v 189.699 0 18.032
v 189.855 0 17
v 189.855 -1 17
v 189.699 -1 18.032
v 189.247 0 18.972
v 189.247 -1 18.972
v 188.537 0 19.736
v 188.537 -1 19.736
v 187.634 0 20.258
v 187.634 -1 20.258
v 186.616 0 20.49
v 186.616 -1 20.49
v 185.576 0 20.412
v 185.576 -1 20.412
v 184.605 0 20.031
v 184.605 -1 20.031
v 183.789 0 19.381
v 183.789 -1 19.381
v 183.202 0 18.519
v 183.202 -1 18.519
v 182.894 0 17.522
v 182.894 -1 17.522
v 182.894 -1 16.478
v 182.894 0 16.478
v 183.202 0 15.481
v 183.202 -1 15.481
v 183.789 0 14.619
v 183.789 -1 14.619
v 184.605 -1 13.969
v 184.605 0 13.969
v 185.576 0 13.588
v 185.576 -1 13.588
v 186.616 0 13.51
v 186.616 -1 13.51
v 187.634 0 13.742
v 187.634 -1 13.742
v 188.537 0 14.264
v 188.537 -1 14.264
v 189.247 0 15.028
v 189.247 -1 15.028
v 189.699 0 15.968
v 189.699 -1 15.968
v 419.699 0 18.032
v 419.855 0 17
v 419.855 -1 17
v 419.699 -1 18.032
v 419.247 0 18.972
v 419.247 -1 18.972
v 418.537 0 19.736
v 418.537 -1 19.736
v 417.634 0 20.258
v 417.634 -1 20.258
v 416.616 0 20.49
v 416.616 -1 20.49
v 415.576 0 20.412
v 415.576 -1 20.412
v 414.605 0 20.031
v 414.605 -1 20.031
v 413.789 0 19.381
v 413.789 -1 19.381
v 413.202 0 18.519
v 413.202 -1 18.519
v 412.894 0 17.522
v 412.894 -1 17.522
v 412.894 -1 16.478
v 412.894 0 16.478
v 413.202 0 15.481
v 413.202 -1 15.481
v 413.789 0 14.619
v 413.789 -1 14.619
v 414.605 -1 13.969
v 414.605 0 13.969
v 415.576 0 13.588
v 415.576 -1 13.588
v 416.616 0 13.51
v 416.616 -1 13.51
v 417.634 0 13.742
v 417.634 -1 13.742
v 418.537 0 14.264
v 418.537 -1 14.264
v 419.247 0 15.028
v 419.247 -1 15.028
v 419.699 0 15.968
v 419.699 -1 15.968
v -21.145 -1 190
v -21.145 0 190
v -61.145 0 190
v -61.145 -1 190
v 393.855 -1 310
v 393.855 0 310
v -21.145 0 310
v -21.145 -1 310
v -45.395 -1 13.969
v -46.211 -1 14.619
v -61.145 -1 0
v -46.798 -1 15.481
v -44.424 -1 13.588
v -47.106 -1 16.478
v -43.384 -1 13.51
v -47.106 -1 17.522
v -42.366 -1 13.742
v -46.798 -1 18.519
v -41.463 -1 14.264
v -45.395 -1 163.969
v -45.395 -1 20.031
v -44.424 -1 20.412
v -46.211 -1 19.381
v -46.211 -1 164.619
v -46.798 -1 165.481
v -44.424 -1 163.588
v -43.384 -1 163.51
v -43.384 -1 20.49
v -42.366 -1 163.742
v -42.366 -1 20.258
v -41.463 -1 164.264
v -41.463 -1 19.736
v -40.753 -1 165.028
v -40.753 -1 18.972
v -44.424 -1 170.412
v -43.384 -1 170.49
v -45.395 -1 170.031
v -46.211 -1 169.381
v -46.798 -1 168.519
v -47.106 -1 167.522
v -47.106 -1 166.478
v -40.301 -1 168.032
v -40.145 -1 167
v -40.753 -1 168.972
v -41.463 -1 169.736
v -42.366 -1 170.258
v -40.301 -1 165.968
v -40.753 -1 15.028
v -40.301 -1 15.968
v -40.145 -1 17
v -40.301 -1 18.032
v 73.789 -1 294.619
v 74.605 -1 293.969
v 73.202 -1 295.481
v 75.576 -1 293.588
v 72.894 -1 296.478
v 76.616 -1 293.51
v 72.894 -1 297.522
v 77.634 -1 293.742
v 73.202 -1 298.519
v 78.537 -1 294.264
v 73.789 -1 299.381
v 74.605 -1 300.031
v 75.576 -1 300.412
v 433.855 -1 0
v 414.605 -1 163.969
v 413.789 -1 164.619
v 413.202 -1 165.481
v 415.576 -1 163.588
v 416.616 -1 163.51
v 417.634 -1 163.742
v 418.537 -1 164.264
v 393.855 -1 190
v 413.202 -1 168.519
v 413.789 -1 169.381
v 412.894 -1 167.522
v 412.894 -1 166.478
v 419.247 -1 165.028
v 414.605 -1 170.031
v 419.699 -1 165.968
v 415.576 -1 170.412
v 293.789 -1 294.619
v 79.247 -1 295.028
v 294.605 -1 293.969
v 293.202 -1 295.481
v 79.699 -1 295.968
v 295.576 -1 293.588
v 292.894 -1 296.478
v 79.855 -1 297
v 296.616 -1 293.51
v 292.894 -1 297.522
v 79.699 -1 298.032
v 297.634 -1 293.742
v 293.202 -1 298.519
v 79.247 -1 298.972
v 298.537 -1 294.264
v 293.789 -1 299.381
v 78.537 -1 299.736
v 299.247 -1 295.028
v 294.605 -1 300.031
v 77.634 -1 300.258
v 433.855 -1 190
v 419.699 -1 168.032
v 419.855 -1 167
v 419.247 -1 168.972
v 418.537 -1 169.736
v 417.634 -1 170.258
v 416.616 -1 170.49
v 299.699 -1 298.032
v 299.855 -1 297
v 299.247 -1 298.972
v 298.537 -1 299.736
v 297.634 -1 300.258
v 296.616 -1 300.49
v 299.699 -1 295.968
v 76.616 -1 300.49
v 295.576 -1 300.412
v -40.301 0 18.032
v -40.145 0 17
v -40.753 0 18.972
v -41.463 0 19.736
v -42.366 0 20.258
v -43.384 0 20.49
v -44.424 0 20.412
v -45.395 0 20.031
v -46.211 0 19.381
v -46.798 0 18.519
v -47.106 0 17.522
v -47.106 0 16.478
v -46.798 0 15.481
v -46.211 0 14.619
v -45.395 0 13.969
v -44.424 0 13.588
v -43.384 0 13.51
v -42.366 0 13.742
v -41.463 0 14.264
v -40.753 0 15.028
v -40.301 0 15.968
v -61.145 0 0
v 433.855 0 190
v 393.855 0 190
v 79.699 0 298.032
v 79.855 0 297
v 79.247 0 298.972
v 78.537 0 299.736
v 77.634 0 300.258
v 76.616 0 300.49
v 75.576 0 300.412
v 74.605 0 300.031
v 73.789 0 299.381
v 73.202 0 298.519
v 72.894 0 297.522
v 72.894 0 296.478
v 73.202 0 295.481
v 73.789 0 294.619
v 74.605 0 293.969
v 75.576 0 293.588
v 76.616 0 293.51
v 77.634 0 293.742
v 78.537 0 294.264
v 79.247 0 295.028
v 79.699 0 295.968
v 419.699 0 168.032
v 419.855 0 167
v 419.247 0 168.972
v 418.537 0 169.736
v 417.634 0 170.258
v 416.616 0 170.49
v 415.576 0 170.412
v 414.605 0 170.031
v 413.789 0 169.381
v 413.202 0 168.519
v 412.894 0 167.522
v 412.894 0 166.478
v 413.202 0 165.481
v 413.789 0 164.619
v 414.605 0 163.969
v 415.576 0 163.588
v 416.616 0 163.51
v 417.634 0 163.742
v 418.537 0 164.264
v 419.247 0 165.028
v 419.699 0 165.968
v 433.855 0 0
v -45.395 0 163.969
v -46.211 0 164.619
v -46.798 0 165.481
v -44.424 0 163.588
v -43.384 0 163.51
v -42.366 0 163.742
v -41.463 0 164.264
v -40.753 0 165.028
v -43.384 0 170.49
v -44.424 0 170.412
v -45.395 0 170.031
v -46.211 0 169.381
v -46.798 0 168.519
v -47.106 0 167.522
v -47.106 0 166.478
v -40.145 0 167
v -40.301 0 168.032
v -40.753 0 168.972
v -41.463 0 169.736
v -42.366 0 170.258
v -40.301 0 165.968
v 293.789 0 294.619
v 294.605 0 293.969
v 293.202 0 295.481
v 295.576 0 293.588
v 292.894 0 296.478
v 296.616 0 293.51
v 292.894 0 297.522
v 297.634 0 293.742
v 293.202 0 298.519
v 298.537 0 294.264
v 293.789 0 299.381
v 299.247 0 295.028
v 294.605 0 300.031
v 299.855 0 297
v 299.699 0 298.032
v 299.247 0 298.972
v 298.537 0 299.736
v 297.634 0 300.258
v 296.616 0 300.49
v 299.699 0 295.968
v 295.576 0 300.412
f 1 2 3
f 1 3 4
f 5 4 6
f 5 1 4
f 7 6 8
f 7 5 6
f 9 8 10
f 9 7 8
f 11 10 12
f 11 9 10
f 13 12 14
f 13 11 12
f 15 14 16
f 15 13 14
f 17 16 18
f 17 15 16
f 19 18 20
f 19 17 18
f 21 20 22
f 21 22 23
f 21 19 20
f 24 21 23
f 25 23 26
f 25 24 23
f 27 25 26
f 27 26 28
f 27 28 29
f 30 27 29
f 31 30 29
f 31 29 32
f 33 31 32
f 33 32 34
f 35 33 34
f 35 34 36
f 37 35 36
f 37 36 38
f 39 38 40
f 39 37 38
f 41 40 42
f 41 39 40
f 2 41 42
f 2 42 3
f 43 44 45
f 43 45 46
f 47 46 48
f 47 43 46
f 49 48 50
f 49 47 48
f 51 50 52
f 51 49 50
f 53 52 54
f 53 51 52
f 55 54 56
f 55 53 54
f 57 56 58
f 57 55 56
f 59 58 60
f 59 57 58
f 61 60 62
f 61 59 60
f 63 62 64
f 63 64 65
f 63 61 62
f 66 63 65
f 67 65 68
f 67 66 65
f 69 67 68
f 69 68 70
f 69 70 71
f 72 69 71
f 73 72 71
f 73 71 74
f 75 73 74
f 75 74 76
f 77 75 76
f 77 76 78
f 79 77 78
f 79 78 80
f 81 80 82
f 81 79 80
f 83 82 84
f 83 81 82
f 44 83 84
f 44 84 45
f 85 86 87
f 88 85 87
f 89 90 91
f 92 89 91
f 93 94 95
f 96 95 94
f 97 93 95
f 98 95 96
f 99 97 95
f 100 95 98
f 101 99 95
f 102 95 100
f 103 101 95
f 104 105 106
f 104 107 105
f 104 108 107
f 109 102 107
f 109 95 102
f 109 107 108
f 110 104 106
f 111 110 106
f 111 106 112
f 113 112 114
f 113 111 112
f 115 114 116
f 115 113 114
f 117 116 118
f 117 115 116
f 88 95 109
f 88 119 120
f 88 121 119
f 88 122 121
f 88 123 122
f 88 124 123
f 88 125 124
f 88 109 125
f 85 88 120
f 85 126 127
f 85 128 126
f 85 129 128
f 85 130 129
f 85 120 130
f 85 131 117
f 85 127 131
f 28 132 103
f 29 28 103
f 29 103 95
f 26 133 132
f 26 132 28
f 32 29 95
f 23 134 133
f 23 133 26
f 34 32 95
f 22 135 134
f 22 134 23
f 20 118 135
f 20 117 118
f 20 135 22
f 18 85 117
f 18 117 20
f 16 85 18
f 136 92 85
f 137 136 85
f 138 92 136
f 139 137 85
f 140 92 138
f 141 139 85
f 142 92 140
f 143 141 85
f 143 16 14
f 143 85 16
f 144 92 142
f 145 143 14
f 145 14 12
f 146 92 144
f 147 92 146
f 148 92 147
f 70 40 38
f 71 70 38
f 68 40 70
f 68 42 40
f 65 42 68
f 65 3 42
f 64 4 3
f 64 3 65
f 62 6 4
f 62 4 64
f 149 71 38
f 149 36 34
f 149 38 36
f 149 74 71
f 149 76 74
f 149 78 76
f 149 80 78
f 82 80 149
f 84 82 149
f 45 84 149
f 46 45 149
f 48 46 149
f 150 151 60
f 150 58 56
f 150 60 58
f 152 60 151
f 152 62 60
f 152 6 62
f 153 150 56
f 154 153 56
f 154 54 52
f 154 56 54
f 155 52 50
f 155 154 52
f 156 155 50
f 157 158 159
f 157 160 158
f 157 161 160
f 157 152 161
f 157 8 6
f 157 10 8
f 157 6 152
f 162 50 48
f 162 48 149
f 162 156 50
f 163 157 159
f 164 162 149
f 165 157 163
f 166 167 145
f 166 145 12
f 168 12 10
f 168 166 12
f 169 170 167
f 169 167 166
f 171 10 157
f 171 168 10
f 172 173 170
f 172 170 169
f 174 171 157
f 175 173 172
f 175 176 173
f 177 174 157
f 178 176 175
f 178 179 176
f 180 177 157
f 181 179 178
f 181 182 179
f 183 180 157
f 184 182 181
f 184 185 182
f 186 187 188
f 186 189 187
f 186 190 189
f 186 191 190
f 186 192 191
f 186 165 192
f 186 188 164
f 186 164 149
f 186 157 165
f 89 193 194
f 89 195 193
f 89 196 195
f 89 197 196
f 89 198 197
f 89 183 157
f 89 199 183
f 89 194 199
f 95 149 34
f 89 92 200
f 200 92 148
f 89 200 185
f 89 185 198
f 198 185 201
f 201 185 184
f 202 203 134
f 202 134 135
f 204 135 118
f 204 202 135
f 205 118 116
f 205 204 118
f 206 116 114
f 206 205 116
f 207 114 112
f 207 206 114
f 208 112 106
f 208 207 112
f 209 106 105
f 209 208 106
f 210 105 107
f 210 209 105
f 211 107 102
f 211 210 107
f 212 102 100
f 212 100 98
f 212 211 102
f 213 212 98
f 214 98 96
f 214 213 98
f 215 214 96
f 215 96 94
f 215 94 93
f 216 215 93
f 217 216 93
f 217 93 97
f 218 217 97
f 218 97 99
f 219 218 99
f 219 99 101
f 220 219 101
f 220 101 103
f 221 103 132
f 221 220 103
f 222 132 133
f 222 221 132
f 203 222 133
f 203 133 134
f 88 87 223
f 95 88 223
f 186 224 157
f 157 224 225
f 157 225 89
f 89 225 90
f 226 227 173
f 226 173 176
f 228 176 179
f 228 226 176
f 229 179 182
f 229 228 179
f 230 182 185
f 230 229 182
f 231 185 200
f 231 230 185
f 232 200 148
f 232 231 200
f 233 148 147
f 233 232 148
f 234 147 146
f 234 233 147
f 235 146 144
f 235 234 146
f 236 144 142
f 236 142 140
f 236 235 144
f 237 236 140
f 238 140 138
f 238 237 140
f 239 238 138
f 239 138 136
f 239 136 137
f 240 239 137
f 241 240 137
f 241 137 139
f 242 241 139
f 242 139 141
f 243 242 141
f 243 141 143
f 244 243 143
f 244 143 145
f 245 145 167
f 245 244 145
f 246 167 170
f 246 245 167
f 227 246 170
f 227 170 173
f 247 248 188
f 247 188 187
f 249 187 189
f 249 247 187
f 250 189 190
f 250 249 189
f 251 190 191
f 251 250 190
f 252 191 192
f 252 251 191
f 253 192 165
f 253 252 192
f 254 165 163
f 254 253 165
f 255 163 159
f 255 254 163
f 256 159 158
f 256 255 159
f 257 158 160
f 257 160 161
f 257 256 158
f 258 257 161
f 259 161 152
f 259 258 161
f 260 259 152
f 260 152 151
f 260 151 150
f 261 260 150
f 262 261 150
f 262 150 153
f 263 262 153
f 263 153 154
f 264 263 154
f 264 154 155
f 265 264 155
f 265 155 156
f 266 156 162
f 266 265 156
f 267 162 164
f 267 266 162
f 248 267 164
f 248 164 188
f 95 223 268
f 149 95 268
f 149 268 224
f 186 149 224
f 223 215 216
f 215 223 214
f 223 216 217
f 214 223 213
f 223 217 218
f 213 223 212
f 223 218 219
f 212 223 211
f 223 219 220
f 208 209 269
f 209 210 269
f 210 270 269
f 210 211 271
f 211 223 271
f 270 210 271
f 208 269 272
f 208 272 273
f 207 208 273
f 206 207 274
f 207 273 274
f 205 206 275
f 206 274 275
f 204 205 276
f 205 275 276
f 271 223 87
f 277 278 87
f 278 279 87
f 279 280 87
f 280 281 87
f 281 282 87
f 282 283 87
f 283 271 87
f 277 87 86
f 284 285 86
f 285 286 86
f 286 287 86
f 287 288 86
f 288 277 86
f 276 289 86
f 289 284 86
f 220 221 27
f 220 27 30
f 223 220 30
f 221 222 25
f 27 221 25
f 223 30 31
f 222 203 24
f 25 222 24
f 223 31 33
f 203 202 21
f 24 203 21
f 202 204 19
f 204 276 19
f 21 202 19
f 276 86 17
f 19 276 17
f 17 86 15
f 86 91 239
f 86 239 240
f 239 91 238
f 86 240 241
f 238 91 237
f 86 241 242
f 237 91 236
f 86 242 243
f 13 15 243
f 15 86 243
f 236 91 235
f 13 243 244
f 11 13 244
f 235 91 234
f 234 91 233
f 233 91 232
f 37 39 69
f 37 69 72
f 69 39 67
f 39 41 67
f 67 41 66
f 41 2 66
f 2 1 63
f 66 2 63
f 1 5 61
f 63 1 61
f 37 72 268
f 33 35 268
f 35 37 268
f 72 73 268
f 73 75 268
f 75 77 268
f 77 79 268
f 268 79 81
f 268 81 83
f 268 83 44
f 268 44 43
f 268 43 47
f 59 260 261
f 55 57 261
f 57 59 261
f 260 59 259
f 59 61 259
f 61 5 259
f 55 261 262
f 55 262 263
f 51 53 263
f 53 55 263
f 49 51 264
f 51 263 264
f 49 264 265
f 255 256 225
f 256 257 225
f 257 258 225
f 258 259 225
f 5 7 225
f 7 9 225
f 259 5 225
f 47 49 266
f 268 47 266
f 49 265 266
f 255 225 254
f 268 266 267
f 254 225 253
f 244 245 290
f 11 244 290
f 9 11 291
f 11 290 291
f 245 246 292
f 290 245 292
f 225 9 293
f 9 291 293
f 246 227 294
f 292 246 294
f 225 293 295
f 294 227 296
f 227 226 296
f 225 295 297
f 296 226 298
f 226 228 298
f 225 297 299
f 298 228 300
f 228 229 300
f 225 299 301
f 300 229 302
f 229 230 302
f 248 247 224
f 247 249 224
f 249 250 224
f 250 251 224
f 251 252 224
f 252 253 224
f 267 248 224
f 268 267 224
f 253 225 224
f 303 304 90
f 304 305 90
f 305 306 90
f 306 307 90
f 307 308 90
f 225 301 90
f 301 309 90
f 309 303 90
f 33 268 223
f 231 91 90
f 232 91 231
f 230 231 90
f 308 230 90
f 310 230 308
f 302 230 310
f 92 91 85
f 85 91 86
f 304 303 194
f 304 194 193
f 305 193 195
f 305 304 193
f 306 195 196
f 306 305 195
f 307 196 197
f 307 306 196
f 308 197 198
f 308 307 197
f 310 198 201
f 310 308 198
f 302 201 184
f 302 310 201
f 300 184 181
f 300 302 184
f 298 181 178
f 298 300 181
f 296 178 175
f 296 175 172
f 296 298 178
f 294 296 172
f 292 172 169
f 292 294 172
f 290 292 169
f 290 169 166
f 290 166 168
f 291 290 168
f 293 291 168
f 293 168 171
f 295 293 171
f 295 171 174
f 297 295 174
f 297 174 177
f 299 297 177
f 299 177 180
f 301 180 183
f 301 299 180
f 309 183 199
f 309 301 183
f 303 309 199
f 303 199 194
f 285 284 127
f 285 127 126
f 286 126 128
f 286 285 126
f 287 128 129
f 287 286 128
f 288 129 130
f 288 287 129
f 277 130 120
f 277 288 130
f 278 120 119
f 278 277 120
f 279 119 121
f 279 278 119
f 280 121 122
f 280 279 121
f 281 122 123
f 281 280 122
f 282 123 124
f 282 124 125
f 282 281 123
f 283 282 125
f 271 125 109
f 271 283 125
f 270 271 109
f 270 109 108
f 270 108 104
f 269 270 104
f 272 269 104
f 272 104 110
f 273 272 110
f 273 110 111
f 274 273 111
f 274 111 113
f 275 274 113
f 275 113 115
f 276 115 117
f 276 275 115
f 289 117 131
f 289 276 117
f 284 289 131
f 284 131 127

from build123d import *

# Parameters (mm, degrees)
F0_R     = 3.5
F1_DEPTH = 1


with BuildPart() as f1:
    # F0 (on Front) → F1 (new body)
    with BuildSketch(Plane.XZ):
        Polygon((-61.145082, 190), (-61.145082, 0), (433.854918, 0), (433.854918, 190), (393.854918, 190), (393.854918, 310), (186.354918, 310), (-21.145082, 310), (-21.145082, 190), align=None)
        with Locations((-43.645082, 17)):
            Circle(F0_R, mode=Mode.SUBTRACT)
        with Locations((186.354918, 17)):
            Circle(F0_R, mode=Mode.SUBTRACT)
        with Locations((416.354918, 17)):
            Circle(F0_R, mode=Mode.SUBTRACT)
        with Locations((-43.645082, 167)):
            Circle(F0_R, mode=Mode.SUBTRACT)
        with Locations((76.354918, 297)):
            Circle(F0_R, mode=Mode.SUBTRACT)
        with Locations((416.354918, 167)):
            Circle(F0_R, mode=Mode.SUBTRACT)
        with Locations((296.354918, 297)):
            Circle(F0_R, mode=Mode.SUBTRACT)
    extrude(amount=F1_DEPTH)


solid = f1.part
